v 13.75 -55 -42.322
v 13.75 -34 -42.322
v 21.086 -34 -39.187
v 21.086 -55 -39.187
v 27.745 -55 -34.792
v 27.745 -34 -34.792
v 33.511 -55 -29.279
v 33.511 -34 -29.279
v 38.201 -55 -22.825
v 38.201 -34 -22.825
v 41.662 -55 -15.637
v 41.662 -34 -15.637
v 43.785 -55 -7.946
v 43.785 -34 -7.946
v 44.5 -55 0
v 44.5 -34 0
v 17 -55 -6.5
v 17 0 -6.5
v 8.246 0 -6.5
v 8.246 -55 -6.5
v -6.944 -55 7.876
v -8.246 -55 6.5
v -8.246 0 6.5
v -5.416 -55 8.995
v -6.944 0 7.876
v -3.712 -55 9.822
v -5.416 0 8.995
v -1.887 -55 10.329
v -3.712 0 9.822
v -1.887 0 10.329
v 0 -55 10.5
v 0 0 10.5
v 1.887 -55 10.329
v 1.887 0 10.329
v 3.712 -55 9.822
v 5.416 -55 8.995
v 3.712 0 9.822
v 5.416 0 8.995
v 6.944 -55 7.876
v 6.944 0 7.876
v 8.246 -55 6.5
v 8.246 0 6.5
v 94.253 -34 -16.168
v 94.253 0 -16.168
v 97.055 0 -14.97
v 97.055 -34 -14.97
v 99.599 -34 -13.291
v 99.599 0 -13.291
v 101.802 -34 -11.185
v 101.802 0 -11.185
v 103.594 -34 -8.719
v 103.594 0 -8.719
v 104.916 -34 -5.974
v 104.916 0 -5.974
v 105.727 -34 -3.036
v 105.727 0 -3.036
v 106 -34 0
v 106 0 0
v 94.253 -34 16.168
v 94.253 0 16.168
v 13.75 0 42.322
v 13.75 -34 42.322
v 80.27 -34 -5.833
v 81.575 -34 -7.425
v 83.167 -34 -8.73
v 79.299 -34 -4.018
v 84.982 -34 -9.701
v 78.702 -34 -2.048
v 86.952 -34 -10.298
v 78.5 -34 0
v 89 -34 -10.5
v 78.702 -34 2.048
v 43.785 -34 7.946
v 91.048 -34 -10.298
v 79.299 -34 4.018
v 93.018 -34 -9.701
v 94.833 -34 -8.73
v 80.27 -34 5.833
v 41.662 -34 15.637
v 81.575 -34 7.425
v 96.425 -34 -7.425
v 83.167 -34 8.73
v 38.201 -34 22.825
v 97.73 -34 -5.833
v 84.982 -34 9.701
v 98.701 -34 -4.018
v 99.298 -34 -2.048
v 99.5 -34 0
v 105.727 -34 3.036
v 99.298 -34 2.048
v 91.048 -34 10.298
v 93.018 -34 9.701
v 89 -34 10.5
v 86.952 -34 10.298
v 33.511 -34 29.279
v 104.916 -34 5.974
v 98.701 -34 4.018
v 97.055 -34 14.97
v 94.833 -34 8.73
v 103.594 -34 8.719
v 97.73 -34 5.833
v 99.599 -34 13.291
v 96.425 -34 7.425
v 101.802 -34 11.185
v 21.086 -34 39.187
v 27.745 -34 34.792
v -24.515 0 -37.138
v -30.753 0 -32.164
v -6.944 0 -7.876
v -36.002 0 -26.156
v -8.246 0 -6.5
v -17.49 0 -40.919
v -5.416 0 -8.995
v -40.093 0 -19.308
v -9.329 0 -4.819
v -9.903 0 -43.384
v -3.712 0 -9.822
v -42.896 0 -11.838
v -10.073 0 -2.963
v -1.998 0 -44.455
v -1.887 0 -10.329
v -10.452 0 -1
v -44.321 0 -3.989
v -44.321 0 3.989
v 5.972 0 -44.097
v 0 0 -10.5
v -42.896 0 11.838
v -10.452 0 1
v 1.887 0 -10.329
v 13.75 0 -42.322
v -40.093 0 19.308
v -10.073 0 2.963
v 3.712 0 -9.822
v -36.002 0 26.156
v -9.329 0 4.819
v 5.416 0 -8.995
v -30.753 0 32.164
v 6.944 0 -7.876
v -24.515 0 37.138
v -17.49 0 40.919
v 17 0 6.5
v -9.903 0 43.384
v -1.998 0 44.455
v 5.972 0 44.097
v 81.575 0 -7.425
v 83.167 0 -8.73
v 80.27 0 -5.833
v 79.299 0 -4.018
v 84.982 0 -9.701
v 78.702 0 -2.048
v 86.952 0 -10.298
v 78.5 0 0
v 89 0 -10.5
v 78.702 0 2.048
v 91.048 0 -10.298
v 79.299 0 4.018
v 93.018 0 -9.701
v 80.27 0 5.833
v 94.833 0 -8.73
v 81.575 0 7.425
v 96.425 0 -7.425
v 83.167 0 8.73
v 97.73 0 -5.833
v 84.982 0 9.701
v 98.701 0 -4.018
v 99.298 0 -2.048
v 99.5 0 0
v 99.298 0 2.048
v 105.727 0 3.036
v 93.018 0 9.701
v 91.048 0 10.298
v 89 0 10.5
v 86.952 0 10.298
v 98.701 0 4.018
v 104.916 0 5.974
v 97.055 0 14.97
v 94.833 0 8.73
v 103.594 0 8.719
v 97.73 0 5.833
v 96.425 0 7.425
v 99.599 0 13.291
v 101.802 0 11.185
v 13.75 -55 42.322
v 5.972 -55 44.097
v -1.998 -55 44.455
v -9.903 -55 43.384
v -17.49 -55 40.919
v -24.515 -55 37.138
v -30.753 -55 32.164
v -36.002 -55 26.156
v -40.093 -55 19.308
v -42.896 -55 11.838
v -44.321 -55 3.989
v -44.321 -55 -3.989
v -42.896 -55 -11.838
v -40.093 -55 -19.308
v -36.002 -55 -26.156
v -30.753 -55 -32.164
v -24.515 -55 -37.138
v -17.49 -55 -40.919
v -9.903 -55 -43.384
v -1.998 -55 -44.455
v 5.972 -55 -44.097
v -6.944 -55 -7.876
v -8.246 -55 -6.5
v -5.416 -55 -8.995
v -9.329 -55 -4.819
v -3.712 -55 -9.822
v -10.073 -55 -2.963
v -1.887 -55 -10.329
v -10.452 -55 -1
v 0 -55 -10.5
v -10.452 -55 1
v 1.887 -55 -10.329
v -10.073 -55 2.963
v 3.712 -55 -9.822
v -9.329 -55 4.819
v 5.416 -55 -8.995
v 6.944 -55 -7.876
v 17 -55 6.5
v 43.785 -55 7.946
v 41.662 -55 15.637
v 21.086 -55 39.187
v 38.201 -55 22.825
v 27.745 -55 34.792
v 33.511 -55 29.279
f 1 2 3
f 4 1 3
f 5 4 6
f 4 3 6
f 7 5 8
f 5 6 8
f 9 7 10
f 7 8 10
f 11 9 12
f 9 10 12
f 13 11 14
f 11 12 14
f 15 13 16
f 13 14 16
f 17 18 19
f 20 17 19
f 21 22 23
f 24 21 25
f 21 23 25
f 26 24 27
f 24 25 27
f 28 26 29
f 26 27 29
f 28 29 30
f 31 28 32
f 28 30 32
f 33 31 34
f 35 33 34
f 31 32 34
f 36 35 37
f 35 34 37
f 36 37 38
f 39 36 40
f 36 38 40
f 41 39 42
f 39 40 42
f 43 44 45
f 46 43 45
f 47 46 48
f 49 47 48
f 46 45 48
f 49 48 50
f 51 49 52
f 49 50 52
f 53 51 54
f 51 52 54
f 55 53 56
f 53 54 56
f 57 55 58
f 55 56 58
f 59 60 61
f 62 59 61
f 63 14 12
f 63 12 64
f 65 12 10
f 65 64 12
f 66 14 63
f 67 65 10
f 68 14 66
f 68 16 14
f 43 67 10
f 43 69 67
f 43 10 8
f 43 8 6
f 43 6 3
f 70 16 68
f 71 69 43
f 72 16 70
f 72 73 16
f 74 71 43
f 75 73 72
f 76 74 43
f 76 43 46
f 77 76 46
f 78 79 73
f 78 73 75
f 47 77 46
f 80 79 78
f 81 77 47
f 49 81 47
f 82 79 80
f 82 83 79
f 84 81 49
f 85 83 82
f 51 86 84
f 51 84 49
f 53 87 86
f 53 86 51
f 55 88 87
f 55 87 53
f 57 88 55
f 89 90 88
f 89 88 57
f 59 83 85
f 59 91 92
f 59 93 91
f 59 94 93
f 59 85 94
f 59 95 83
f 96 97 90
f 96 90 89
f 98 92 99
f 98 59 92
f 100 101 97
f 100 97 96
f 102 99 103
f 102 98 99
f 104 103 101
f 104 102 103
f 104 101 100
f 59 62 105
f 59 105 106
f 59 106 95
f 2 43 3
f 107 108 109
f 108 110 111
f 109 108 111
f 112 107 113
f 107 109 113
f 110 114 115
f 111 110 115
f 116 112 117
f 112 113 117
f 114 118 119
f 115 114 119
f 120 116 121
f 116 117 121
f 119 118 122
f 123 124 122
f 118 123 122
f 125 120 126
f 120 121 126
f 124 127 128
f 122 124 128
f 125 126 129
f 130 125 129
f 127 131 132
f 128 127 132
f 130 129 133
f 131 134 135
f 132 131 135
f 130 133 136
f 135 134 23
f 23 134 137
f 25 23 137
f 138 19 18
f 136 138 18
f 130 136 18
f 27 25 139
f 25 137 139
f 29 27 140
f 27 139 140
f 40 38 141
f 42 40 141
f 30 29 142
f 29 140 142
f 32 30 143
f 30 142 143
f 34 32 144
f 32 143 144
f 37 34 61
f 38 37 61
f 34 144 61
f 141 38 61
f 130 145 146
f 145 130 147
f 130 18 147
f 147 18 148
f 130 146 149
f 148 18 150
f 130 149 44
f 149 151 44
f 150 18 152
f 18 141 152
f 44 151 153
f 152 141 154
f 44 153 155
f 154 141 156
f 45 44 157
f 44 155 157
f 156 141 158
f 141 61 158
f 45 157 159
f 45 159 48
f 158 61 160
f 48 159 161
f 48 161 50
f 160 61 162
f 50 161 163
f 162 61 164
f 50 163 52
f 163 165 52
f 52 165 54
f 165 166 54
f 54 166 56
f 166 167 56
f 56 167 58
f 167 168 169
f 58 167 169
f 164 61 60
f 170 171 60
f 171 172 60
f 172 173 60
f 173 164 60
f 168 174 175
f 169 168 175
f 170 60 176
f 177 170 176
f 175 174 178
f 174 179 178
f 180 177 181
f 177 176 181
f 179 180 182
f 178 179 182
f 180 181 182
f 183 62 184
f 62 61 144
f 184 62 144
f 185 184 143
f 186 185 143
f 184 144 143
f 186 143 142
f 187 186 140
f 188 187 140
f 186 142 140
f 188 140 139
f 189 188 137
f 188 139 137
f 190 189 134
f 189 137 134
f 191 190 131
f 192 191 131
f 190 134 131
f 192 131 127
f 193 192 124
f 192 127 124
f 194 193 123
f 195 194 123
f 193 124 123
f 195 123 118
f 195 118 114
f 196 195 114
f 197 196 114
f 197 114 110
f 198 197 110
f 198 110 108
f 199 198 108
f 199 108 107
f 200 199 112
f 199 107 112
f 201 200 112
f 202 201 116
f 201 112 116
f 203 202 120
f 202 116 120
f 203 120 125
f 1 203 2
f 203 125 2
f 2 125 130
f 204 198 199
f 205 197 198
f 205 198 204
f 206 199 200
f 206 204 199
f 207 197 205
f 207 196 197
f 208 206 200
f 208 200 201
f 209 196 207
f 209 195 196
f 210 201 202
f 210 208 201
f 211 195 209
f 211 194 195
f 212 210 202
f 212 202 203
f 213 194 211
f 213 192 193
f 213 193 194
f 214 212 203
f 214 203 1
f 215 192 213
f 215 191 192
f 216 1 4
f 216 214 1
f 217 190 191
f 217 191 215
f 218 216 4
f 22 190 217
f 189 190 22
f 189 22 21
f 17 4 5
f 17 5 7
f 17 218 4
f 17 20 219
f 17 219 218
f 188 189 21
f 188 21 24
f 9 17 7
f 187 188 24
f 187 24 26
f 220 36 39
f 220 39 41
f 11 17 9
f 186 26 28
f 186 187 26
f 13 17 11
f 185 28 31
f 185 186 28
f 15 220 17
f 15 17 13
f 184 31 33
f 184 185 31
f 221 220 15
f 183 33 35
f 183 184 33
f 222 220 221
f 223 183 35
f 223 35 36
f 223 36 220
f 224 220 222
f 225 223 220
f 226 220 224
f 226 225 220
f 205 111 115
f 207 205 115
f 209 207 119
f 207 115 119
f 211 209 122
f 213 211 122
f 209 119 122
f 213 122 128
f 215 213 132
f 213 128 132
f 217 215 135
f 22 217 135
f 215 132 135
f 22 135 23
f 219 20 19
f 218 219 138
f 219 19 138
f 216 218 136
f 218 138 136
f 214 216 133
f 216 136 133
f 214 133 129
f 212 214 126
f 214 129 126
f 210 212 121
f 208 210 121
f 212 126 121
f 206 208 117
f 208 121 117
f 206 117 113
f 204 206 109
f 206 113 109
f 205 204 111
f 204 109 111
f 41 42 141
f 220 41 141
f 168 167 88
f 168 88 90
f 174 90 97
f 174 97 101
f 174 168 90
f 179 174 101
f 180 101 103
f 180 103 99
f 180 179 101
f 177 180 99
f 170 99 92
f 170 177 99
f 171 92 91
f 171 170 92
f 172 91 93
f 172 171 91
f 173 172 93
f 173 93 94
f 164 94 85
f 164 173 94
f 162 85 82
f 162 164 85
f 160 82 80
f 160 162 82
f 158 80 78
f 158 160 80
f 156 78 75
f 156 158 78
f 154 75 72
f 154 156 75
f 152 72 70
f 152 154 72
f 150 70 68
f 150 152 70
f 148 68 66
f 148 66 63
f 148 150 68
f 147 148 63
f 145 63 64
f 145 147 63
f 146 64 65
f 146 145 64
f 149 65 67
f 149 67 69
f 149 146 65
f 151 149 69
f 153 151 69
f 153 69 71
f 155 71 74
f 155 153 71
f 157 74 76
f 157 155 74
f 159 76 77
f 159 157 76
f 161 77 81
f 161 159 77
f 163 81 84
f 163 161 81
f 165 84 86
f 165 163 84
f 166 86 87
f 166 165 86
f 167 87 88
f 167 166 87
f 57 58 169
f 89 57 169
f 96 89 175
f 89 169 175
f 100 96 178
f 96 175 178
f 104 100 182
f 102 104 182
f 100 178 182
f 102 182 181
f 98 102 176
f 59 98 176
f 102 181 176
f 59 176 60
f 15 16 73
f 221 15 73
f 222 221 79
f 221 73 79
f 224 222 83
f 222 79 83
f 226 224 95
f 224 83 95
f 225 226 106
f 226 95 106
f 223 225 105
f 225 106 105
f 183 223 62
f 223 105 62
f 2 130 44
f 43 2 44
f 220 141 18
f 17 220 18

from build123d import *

# Parameters (mm, degrees)
F0_R     = 10.5
F1_DEPTH = 34
F2_DEPTH = 55


with BuildPart() as f1:
    # F0 (on Front) → F1 (new body)
    with BuildSketch(Plane.XZ):
        with BuildLine():
            ThreePointArc((106, 0), (102.753141, 9.992553), (94.252809, 16.168117))
            ThreePointArc((94.252809, 16.168117), (72, 0), (94.252809, -16.168117))
            ThreePointArc((94.252809, -16.168117), (102.753141, -9.992553), (106, 0))
        make_face()
        with Locations((89, 0)):
            Circle(F0_R, mode=Mode.SUBTRACT)
        with BuildLine():
            ThreePointArc((13.75, 42.322423), (36.000868, 26.156978), (44.5, 0))
            ThreePointArc((44.5, 0), (36.000868, -26.156978), (13.75, -42.322423))
            Line((13.75, -42.322423), (94.252809, -16.168117))
            ThreePointArc((94.252809, -16.168117), (72, 0), (94.252809, 16.168117))
            Line((94.252809, 16.168117), (13.75, 42.322423))
        make_face()
        with BuildLine():
            ThreePointArc((13.75, -42.322423), (36.000868, -26.156978), (44.5, 0))
            ThreePointArc((44.5, 0), (36.000868, 26.156978), (13.75, 42.322423))
            ThreePointArc((13.75, 42.322423), (-44.5, 0), (13.75, -42.322423))
        make_face()
        with BuildLine():
            ThreePointArc((-8.246211, 6.5), (0, 10.5), (8.246211, 6.5))
            Line((8.246211, 6.5), (17, 6.5))
            Line((17, 6.5), (17, -6.5))
            Line((17, -6.5), (8.246211, -6.5))
            ThreePointArc((8.246211, -6.5), (0, -10.5), (-8.246211, -6.5))
            Line((-8.246211, -6.5), (-17, -6.5))
            Line((-17, -6.5), (-17, 6.5))
            Line((-17, 6.5), (-8.246211, 6.5))
        make_face(mode=Mode.SUBTRACT)
        with BuildLine():
            ThreePointArc((-8.246211, -6.5), (-10.5, 0), (-8.246211, 6.5))
            Line((-8.246211, 6.5), (-17, 6.5))
            Line((-17, 6.5), (-17, -6.5))
            Line((-17, -6.5), (-8.246211, -6.5))
        make_face()
    extrude(amount=F1_DEPTH)

    # F0 (on Front) → F2 (join)
    with BuildSketch(Plane.XZ):
        with BuildLine():
            ThreePointArc((13.75, -42.322423), (36.000868, -26.156978), (44.5, 0))
            ThreePointArc((44.5, 0), (36.000868, 26.156978), (13.75, 42.322423))
            ThreePointArc((13.75, 42.322423), (-44.5, 0), (13.75, -42.322423))
        make_face()
        with BuildLine():
            ThreePointArc((-8.246211, 6.5), (0, 10.5), (8.246211, 6.5))
            Line((8.246211, 6.5), (17, 6.5))
            Line((17, 6.5), (17, -6.5))
            Line((17, -6.5), (8.246211, -6.5))
            ThreePointArc((8.246211, -6.5), (0, -10.5), (-8.246211, -6.5))
            Line((-8.246211, -6.5), (-17, -6.5))
            Line((-17, -6.5), (-17, 6.5))
            Line((-17, 6.5), (-8.246211, 6.5))
        make_face(mode=Mode.SUBTRACT)
        with BuildLine():
            ThreePointArc((-8.246211, -6.5), (-10.5, 0), (-8.246211, 6.5))
            Line((-8.246211, 6.5), (-17, 6.5))
            Line((-17, 6.5), (-17, -6.5))
            Line((-17, -6.5), (-8.246211, -6.5))
        make_face()
    extrude(amount=F2_DEPTH)


solid = f1.part
